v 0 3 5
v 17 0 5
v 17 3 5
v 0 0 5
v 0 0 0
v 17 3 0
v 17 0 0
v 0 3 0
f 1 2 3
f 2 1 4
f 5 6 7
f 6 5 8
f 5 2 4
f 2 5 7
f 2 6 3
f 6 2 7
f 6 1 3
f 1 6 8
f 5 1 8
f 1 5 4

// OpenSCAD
// Generated by SolidPython 1.0.1 on 2020-07-29 00:46:56


cube(size = [17, 3, 5]);
/***********************************************
*********      SolidPython code:      **********
************************************************
 
# import packages: SolidPython
from solid import *
from solid.utils import *
from itertools import chain, combinations, permutations


class Resize:

    def __init__(self, scad_file):
        self.scad_file = scad_file
        #self.scad_file = import_scad(scad_file)
        # cone/cylinder param:
        self.r1 = 0
        self.r2 = 0
        self.h = 0
        # rectangular prism param:
        self.w = 0
        self.l = 0
        # ellipse param:
        self.r = 0

    # import OpenScad code (file name corresponds to shape)


    # classify shape + parameters
    def assign(self, param1, param2, param3):
        if self.scad_file == 'cone.scad':
            self.r1 = param1
            self.r2 = param2
            self.h = param3
        elif self.scad_file == 'cylinder.scad':
            self.r1 = param1
            self.r2 = param2
            self.h = param3
        elif self.scad_file == 'rectangularPrism.scad':
            self.h = param1
            self.l = param2
            self.w = param3
        else:
            self.r = param1
            self.h = param2

    # resize parameters
    def iterate(self):
        x = range(3, 20, 2)
        i = 1
        if self.scad_file == 'cone.scad':
            tempList = list(permutations(x, 2))
            for temp in tempList:
                param1 = temp[0]
                param2 = temp[1]
                filepath = 'produced_scad_files/' + 'cone' + str(param1) + '_' + str(param2) + '_' + '.scad'
                scad_render_to_file(cylinder(h=param1, r1=param2, r2=0), filepath)

        elif self.scad_file == 'cylinder.scad':
            tempList = list(permutations(x, 3))
            for temp in tempList:
                param1 = temp[0]
                param2 = temp[1]
                filepath = 'produced_scad_files/' + 'cylinder' + str(param1) + '_' + str(param2) + '_' + '.scad'
                scad_render_to_file(cylinder(h=param1, r1=param2, r2=param2), filepath)

        elif self.scad_file == 'rectangularPrism.scad':
            tempList = list(permutations(x, 3))
            for temp in tempList:
                param1 = temp[0]
                param2 = temp[1]
                param3 = temp[2]
                filepath = 'produced_scad_files/' + 'rectangularPrism' + str(param1) + '_' + str(param2) + '_' + str(
                    param3) + '.scad'
                scad_render_to_file(cube(size=(param1, param2, param3)), filepath)

        elif self.scad_file == 'ellipse.scad':
            tempList = list(permutations(x, 4))
            for temp in tempList:
                param1 = temp[0]
                param2 = temp[1]
                param3 = temp[2]
                param4 = temp[3]
                filepath = 'produced_scad_files/' + 'ellipse' + str(param1) + '_' + str(param2) + '_' + str(param3) + '_' + str(param4) + '.scad'
                scad_render_to_file(scale([param1, param2, param3])(sphere(r=param4)), filepath)

    def render_to_scadfile(self):
        scad_render_to_file(scad, 'example.scad') 
 
************************************************/
